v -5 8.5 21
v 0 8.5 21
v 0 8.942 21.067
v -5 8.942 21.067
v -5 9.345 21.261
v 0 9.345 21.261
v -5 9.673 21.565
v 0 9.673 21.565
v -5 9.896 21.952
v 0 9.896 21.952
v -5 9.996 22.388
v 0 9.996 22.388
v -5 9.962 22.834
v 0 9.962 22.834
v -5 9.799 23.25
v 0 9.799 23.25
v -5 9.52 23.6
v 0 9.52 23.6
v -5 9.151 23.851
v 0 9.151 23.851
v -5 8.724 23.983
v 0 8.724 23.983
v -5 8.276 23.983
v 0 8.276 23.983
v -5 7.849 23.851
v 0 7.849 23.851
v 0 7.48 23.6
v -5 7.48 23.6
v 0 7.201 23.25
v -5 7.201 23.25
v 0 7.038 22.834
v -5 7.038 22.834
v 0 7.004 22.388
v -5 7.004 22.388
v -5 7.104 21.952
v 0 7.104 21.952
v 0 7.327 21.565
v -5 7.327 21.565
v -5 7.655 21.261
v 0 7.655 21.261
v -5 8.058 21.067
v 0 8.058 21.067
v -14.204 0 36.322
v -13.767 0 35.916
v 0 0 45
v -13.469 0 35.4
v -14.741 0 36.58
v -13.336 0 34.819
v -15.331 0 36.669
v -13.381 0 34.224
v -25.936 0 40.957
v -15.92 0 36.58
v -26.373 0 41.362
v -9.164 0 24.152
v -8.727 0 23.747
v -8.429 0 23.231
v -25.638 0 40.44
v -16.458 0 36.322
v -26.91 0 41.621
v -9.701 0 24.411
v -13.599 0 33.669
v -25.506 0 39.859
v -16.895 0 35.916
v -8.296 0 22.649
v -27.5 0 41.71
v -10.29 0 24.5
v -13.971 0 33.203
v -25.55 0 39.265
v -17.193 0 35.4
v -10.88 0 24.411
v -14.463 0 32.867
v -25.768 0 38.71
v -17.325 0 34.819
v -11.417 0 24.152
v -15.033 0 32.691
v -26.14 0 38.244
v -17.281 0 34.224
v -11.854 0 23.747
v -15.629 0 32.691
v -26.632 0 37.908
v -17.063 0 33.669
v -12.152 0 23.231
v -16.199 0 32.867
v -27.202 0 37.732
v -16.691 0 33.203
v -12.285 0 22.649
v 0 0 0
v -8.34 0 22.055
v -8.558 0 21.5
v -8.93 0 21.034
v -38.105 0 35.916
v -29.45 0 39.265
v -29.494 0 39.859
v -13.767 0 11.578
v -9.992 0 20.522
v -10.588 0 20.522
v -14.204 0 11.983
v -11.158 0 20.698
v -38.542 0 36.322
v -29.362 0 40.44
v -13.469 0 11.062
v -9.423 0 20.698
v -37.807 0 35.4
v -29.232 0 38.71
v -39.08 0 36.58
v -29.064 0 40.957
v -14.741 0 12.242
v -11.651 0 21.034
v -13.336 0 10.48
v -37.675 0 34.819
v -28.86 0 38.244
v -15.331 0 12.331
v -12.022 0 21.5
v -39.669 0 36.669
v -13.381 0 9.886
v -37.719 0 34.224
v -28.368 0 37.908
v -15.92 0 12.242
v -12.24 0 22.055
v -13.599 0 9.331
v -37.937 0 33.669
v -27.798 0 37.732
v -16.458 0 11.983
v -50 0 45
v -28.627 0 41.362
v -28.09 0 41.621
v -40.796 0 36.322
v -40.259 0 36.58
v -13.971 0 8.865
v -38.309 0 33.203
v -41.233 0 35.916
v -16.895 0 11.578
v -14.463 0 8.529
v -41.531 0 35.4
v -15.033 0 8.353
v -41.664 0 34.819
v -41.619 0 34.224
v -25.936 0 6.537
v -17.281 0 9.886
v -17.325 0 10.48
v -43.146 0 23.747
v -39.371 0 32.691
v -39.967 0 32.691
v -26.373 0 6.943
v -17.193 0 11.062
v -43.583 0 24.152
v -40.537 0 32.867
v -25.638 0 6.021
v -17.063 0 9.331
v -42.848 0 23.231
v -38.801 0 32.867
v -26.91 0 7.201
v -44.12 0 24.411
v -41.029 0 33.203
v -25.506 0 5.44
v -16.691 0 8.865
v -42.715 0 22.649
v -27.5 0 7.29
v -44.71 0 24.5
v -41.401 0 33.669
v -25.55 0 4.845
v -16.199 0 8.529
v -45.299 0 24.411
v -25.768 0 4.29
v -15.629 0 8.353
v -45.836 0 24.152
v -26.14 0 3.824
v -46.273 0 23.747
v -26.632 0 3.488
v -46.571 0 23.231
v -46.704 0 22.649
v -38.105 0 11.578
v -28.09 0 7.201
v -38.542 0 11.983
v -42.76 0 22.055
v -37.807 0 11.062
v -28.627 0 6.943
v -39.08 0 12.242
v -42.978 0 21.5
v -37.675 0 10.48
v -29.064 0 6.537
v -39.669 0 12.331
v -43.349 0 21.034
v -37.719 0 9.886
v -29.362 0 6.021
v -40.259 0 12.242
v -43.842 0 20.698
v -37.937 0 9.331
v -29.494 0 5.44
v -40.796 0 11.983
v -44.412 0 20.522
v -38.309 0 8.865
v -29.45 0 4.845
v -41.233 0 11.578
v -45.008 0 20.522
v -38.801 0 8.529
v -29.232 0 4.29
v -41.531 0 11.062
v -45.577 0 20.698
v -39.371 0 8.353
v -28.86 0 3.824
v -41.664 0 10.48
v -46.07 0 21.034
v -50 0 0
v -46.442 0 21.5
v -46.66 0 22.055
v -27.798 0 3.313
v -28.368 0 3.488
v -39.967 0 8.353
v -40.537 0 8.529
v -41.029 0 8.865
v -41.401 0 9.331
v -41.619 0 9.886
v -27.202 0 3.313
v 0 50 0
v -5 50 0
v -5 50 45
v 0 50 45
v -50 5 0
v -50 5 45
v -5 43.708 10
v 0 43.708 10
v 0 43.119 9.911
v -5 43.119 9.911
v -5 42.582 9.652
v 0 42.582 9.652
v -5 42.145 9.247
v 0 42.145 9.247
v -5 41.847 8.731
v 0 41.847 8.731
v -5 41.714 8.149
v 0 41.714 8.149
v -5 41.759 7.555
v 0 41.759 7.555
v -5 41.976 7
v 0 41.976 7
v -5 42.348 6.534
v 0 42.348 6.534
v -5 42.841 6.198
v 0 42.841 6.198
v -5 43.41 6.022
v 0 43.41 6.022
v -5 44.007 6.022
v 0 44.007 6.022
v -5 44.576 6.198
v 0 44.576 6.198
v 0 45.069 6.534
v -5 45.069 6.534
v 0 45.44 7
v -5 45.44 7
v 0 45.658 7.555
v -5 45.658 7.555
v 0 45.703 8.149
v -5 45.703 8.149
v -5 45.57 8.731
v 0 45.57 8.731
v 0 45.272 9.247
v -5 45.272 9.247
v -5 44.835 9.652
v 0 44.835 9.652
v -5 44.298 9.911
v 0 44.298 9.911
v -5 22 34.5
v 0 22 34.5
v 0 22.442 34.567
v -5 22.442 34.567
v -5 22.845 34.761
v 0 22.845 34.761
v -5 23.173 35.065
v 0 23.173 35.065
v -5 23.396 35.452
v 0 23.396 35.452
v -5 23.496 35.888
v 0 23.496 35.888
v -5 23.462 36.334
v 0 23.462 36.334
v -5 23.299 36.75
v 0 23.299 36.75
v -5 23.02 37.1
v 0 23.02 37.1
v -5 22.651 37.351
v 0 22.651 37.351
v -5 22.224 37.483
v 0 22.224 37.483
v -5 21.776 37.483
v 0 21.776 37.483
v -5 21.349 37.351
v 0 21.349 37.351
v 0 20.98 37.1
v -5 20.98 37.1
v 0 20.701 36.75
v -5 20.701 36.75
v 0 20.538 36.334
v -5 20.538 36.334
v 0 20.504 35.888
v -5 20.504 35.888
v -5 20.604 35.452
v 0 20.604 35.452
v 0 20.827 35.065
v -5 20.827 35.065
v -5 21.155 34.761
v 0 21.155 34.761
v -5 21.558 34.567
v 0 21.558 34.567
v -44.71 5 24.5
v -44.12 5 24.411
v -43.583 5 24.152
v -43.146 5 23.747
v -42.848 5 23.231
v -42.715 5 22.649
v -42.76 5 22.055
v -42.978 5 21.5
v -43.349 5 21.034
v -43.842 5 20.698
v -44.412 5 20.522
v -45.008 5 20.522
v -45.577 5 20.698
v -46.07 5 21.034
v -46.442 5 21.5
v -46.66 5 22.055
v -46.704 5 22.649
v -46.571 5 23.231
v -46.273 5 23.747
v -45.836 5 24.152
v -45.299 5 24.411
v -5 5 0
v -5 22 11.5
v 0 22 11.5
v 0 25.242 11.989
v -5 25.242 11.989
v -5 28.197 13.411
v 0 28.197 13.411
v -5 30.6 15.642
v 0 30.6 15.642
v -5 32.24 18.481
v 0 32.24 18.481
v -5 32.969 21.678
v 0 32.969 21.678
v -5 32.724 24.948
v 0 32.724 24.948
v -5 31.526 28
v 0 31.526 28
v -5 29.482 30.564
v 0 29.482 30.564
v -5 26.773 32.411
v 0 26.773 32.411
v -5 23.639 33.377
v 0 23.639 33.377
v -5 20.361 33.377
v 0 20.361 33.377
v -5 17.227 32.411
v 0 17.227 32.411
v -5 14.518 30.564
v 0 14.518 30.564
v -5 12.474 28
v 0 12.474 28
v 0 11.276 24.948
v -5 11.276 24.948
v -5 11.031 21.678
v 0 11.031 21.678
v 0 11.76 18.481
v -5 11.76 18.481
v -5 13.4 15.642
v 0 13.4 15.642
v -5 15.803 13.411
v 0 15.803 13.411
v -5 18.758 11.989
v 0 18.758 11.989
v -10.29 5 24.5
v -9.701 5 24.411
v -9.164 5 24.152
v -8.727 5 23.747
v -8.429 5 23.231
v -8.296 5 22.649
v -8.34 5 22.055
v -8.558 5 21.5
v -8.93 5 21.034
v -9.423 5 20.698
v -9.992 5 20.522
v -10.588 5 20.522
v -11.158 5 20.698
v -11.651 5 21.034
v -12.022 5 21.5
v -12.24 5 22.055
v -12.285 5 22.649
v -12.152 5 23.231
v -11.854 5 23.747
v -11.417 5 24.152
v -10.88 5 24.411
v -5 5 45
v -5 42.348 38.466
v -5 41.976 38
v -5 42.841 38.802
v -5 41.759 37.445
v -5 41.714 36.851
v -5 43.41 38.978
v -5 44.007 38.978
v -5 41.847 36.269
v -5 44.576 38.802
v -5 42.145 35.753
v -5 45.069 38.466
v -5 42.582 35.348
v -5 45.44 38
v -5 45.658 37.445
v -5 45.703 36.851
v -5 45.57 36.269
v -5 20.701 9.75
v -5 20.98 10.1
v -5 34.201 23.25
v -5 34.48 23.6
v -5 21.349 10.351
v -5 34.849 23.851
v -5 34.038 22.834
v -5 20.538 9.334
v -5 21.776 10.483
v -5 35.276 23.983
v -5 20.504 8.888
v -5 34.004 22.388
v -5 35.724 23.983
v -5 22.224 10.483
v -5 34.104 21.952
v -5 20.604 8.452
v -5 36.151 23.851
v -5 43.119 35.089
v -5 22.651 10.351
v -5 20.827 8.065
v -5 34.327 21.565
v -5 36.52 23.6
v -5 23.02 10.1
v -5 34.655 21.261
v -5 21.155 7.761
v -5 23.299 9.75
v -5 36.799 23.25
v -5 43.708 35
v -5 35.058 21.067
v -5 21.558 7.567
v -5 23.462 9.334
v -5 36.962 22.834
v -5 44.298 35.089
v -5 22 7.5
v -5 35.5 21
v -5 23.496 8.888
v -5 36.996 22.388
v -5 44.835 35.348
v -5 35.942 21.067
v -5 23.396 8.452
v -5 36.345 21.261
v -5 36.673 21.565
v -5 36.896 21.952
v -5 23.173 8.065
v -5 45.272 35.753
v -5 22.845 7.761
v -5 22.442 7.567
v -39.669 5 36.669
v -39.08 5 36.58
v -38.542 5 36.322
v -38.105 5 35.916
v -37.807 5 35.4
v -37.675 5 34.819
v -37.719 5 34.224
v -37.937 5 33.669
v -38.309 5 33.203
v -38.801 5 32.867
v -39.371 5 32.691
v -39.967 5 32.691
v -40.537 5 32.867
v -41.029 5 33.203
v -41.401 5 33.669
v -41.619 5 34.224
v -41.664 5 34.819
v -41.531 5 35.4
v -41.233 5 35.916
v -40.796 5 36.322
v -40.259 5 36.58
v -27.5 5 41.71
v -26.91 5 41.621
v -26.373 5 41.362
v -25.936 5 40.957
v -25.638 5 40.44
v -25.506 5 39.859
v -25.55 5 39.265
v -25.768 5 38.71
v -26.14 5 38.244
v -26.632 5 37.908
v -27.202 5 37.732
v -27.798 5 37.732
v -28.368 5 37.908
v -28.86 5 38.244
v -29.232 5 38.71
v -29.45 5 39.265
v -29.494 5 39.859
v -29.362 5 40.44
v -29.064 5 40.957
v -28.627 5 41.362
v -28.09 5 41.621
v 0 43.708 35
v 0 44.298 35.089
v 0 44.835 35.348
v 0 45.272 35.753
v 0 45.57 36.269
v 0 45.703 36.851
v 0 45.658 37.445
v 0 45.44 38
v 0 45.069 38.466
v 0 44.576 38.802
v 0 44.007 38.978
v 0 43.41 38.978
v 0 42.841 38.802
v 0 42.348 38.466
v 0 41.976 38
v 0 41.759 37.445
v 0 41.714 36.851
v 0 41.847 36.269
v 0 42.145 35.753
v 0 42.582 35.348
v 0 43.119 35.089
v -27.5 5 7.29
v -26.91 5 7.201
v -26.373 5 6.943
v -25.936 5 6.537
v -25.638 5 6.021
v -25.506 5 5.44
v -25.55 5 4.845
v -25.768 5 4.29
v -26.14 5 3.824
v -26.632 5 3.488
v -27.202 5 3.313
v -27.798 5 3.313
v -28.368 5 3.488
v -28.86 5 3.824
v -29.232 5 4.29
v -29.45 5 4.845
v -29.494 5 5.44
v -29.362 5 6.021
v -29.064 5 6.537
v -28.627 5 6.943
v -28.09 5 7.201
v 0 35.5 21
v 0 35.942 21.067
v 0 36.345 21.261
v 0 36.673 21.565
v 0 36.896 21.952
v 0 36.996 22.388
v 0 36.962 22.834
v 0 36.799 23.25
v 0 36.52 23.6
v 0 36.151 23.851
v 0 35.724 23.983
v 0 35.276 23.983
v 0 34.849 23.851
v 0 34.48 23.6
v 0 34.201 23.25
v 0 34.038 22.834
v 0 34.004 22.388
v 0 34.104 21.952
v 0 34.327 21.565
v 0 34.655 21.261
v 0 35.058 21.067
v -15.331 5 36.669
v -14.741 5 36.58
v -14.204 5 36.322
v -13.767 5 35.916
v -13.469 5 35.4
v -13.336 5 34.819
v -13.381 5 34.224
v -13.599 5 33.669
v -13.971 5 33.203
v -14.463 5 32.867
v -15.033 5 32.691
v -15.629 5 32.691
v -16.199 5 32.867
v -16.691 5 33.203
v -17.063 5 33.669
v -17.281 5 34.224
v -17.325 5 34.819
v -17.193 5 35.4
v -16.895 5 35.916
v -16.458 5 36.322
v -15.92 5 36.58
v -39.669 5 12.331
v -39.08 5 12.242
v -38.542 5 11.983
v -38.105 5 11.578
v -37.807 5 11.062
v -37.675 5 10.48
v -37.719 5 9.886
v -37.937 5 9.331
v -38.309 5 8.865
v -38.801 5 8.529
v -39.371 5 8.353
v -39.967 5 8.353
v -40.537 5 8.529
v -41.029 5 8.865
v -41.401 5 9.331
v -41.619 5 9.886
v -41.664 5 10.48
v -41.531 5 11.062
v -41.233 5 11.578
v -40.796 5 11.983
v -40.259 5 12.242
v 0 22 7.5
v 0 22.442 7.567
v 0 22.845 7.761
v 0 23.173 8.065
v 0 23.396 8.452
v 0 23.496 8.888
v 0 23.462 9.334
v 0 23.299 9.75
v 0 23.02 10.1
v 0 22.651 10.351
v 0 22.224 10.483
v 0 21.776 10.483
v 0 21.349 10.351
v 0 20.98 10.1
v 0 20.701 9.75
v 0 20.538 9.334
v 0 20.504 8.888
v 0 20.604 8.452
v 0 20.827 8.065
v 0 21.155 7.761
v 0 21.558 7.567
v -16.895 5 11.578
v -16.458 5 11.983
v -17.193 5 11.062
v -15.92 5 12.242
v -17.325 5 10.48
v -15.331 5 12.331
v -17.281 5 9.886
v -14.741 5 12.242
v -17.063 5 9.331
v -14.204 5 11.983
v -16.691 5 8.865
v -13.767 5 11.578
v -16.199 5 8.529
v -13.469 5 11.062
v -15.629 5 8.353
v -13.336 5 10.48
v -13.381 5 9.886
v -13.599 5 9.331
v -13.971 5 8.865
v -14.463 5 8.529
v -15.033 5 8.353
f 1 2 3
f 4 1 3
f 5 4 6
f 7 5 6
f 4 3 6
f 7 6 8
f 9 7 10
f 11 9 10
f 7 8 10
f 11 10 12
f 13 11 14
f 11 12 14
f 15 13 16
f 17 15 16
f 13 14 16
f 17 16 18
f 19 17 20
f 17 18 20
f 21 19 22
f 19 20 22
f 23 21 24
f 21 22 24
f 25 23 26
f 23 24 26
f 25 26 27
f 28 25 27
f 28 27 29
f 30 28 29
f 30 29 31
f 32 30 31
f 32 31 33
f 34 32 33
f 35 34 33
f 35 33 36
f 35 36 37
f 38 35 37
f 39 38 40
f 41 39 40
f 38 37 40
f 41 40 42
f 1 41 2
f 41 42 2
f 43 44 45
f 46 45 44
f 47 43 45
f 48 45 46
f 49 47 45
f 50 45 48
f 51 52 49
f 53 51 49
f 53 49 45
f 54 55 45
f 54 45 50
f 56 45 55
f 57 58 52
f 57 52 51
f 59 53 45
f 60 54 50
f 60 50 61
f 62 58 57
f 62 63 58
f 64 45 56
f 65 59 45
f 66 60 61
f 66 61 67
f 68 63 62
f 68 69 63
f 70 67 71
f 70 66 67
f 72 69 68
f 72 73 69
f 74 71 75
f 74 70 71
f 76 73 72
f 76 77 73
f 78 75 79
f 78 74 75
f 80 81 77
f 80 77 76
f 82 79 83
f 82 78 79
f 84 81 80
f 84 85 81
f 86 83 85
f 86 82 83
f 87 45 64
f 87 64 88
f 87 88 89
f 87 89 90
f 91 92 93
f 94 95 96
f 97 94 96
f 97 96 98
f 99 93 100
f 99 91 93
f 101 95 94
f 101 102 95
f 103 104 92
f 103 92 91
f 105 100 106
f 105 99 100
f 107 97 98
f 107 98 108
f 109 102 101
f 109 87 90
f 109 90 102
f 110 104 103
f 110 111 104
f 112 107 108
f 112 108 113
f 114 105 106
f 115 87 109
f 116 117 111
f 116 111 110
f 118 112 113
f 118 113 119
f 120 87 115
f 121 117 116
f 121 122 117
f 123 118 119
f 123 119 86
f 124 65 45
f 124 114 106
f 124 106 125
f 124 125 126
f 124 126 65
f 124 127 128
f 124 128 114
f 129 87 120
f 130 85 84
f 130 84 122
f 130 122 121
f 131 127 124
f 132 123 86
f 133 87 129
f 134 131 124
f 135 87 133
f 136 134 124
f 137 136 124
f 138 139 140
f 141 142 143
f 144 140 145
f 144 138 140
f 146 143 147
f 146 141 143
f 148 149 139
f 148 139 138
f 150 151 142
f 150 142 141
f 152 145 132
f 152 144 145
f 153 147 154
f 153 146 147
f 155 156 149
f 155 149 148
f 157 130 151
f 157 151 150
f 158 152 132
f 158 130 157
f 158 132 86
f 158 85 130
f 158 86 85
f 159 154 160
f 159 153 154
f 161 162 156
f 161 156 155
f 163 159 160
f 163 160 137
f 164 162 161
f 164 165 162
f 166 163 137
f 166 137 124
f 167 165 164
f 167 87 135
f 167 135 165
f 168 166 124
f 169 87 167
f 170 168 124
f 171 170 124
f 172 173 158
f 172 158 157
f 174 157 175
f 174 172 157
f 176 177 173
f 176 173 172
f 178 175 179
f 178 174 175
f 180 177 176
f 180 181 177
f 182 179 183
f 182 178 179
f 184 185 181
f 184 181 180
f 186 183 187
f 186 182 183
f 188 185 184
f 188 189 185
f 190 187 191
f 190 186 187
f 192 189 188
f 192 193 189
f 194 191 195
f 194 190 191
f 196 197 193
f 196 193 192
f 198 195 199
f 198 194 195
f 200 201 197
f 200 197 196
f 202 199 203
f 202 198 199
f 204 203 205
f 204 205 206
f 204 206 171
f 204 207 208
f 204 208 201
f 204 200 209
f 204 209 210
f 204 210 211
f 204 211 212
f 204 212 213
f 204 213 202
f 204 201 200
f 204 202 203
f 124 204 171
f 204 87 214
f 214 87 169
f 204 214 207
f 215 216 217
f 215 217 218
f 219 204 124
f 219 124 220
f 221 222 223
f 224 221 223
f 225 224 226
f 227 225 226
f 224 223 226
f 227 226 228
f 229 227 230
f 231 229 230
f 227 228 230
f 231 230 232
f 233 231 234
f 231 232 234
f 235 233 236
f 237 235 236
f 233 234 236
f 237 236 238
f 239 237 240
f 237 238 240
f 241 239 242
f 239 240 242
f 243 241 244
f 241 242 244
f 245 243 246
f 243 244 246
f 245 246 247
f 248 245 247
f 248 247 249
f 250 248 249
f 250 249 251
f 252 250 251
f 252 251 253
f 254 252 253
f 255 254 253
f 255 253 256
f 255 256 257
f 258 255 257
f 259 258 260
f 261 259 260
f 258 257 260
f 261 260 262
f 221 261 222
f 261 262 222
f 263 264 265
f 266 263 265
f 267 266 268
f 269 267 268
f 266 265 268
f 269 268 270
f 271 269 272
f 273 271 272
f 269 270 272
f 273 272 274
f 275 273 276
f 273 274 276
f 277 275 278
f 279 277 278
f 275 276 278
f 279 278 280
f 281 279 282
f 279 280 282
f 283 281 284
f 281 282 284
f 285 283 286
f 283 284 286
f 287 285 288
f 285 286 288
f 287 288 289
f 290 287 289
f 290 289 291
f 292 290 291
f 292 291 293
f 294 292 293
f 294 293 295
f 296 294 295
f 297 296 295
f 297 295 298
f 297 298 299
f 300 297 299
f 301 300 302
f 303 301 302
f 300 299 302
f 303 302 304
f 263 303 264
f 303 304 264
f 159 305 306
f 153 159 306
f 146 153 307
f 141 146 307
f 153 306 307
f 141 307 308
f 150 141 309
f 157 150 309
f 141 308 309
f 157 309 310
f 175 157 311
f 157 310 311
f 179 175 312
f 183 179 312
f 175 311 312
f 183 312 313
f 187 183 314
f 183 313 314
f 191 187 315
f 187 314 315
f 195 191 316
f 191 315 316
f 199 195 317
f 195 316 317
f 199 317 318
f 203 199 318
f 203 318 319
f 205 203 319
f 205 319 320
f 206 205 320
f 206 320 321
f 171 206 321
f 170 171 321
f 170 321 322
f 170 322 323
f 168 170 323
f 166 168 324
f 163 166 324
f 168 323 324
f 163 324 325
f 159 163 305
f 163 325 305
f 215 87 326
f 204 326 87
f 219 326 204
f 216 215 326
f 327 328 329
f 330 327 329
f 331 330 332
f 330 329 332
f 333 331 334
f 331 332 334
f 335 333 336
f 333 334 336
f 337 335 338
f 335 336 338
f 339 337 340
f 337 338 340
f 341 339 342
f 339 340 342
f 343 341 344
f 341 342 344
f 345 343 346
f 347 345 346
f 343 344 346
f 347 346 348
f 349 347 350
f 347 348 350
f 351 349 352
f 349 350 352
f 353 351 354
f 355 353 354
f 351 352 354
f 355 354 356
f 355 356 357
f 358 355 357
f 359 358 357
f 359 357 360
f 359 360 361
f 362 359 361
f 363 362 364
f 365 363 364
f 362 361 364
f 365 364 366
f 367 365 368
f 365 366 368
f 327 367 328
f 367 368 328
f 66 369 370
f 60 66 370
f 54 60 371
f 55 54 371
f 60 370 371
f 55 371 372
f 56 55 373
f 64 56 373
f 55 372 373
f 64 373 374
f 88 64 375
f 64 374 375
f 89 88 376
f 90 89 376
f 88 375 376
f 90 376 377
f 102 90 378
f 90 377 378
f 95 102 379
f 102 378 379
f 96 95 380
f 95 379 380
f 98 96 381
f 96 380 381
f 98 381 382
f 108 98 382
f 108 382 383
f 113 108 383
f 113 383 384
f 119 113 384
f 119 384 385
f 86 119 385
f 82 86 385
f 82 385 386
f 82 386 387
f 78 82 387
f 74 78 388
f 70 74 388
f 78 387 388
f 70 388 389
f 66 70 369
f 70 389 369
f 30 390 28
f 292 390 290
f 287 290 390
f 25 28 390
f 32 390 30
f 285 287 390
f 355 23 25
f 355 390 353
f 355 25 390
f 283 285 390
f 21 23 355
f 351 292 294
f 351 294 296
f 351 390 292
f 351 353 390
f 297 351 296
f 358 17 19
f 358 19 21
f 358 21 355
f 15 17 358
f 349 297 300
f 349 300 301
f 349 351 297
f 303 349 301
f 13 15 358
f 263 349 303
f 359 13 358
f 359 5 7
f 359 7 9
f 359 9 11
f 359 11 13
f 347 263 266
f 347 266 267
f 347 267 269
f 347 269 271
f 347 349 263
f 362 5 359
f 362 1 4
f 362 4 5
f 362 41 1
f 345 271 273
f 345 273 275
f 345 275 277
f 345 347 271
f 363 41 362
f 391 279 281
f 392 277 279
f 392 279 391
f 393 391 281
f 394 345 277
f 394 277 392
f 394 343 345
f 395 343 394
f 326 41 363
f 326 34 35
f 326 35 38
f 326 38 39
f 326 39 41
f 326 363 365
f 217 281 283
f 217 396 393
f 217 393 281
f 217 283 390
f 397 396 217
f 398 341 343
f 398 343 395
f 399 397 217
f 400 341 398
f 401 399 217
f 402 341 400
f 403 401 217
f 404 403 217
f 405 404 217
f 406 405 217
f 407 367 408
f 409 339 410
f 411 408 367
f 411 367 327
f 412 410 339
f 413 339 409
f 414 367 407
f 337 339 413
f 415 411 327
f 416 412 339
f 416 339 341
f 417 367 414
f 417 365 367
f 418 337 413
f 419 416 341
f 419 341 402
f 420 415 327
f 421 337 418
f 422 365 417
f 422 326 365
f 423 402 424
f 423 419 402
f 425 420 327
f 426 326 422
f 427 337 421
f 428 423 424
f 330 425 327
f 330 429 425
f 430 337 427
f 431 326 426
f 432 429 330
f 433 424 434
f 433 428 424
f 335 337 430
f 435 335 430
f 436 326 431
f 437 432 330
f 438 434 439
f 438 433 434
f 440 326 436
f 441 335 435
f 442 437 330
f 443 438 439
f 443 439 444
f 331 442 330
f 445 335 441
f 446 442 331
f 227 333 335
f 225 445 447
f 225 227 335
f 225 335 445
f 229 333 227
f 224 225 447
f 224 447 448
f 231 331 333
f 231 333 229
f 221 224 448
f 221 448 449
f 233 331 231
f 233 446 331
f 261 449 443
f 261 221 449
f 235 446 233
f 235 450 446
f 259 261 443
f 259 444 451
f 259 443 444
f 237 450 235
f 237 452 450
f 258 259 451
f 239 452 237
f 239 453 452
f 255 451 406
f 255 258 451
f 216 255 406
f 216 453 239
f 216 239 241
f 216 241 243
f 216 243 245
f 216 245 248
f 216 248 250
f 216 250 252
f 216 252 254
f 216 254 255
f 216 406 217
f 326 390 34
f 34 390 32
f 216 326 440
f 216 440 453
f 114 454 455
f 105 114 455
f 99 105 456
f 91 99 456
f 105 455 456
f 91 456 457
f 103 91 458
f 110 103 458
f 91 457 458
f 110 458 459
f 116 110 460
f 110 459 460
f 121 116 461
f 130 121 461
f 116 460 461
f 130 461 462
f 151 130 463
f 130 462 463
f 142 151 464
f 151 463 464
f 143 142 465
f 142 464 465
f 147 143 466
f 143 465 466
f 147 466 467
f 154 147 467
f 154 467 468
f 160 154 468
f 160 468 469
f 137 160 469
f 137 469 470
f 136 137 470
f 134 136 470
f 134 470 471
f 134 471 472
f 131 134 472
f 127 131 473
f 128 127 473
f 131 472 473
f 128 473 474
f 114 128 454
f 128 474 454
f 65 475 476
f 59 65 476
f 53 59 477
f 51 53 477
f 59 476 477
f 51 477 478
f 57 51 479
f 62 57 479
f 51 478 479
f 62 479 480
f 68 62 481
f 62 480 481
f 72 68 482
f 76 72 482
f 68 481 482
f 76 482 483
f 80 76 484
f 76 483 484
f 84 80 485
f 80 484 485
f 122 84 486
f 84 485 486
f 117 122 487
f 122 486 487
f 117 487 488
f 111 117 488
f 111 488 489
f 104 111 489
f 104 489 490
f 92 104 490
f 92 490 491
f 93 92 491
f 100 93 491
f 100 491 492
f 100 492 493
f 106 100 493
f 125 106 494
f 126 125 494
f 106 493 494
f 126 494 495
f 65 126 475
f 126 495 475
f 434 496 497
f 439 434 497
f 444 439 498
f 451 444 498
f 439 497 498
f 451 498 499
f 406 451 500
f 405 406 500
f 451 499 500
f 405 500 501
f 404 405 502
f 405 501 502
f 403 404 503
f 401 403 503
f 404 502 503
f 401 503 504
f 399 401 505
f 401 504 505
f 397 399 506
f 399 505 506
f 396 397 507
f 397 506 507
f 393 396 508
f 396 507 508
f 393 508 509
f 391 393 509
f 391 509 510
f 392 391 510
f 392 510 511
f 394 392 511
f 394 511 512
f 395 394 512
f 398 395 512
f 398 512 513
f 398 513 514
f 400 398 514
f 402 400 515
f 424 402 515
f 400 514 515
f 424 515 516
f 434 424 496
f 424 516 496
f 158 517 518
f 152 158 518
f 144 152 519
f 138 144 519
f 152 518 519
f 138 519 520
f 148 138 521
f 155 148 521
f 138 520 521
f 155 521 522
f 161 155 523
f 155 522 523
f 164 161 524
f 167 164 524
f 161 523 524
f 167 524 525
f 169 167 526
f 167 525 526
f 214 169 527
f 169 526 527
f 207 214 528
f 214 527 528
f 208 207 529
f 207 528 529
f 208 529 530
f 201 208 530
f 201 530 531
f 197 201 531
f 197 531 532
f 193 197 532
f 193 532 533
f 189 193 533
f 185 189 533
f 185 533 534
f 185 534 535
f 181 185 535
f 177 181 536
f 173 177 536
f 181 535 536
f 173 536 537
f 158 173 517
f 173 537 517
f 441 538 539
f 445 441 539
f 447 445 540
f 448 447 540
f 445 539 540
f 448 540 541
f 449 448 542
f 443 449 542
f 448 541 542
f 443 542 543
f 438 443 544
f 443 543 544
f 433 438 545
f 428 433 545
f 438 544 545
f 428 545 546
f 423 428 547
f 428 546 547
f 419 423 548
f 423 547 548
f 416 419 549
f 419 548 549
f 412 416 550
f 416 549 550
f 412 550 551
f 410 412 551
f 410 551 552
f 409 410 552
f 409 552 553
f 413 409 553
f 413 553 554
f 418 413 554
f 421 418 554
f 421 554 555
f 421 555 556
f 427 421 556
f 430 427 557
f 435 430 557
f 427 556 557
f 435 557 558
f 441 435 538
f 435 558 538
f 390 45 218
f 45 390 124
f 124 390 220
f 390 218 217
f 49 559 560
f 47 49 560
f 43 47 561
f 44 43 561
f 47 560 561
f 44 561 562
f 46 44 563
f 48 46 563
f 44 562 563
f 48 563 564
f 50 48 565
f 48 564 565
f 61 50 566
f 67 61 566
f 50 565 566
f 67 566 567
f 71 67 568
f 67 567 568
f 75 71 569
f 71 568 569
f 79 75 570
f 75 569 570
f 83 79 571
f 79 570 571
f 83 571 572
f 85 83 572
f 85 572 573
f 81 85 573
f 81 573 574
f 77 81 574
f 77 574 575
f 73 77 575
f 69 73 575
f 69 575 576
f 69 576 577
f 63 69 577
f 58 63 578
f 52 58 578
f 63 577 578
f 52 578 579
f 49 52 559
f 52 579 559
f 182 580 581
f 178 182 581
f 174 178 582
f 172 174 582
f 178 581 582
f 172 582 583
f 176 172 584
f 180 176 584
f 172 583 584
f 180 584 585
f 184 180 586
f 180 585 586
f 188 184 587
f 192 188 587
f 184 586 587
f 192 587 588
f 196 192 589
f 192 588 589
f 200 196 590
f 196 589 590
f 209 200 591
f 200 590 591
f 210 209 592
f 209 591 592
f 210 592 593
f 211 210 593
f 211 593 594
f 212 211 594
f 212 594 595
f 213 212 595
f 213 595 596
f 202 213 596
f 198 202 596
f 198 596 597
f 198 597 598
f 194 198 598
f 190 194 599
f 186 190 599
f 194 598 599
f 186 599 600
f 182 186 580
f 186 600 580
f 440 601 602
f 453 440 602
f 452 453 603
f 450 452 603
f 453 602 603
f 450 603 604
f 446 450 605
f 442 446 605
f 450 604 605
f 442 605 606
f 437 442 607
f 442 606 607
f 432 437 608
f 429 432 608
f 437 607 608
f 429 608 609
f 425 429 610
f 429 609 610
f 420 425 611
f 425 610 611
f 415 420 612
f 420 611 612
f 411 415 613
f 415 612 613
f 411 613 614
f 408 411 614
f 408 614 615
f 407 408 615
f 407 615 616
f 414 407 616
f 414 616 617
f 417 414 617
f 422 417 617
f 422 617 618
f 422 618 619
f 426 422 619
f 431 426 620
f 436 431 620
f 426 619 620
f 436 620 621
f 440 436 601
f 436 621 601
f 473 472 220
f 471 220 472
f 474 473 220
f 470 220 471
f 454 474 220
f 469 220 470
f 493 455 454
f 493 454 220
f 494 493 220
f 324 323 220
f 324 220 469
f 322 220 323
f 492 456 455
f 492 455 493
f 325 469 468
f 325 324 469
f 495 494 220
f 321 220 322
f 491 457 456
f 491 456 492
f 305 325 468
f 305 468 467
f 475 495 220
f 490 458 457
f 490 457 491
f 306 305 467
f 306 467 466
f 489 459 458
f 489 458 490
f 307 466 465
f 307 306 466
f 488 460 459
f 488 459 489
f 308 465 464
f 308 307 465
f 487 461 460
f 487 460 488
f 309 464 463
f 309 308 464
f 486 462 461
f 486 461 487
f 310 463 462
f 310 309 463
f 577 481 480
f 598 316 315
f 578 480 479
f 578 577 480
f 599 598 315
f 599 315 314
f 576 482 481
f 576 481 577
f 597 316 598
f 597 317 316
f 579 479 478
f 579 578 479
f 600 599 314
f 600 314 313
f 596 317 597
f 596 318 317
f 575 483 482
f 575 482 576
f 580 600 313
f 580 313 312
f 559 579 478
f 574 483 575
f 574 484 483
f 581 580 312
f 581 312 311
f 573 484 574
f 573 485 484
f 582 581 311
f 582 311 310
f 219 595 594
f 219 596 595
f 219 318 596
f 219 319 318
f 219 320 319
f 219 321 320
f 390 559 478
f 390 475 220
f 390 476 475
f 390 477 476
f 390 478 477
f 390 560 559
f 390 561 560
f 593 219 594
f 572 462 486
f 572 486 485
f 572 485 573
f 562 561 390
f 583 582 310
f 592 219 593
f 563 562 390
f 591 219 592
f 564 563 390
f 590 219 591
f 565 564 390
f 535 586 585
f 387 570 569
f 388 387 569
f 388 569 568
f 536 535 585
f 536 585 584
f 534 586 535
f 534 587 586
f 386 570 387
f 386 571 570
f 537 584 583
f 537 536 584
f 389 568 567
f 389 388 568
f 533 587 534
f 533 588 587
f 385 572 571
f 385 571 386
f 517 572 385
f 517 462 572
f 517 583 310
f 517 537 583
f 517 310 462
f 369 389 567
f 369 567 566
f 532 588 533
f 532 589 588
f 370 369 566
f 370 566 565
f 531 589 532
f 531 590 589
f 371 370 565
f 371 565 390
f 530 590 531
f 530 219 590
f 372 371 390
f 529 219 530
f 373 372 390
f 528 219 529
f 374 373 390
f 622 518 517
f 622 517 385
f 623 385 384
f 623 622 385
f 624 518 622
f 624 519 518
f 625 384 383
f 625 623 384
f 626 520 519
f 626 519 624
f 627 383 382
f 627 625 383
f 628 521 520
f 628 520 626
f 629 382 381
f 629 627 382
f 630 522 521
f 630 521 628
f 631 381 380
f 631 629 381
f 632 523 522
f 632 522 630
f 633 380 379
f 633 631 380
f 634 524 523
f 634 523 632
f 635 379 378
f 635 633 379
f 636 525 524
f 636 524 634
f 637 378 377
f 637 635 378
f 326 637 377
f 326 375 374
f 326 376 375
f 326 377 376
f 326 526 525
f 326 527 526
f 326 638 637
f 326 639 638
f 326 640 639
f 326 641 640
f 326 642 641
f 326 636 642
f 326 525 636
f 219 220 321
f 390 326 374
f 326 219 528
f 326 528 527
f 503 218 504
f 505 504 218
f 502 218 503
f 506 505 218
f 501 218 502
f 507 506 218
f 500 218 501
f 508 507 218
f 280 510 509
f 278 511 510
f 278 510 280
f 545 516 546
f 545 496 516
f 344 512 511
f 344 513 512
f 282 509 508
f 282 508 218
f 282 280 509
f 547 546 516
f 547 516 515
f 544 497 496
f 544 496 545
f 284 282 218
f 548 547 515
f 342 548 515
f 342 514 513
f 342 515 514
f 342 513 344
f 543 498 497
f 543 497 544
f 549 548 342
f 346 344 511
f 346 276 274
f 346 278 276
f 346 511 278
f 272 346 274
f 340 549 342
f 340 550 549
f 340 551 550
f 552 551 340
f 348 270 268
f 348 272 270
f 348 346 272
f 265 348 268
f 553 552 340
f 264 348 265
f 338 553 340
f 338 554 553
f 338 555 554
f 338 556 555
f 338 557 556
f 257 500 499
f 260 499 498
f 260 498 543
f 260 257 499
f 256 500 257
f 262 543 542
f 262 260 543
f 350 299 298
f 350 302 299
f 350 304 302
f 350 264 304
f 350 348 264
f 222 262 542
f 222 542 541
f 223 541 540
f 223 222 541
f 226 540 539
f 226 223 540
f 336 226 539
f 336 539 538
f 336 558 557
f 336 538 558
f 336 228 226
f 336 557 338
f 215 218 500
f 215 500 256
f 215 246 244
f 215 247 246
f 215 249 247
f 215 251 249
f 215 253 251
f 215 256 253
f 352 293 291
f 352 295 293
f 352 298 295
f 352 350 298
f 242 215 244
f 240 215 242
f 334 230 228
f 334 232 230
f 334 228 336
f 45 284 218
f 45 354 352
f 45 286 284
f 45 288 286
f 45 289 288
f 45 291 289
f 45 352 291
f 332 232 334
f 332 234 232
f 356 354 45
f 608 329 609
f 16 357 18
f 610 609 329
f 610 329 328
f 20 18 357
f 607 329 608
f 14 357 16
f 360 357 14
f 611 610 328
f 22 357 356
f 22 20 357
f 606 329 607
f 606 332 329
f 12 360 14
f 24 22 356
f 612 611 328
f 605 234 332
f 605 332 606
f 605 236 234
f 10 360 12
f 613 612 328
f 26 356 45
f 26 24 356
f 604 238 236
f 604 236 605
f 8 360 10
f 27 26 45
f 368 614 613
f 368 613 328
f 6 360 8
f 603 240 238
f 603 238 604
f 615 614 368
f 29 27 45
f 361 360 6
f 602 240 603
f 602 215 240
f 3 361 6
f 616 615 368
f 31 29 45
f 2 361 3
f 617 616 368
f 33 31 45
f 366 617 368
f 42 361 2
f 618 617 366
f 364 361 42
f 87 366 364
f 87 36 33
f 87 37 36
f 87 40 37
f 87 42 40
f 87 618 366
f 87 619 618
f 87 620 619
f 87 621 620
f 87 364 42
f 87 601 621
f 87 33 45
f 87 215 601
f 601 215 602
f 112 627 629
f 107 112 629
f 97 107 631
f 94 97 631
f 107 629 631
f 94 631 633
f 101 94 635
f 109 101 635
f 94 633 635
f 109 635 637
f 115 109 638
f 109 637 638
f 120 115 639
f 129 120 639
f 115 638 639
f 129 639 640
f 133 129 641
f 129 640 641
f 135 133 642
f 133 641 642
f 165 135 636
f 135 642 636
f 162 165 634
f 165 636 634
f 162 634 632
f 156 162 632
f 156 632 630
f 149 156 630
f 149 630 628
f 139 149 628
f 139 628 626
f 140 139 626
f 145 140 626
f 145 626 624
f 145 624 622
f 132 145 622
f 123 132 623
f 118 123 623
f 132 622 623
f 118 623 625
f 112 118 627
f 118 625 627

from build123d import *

# Parameters (mm, degrees)
BOSS_EXTRUDE1_DEPTH = 45
SKETCH2_R           = 11
CUT_EXTRUDE1_DEPTH  = 5
SKETCH3_R           = 1.5
CUT_EXTRUDE2_DEPTH  = 5
SKETCH4_R           = 2
CUT_EXTRUDE3_DEPTH  = 5
SKETCH5_R           = 2
CUT_EXTRUDE4_DEPTH  = 5


with BuildPart() as part:
    # Sketch1 → Boss-Extrude1 (new body)
    with BuildSketch(Plane.XY):
        Polygon((0, 50), (0, 0), (-50, 0), (-50, 5), (-5, 5), (-5, 50), align=None)
    extrude(amount=BOSS_EXTRUDE1_DEPTH)

    # Sketch2 → Cut-Extrude1 (cut)
    with BuildSketch(Plane(origin=(0, 0, 0), x_dir=(0, 0, -1), z_dir=(1, 0, 0))):
        with Locations((-22.5, 22)):
            Circle(SKETCH2_R)
    extrude(amount=-CUT_EXTRUDE1_DEPTH, mode=Mode.SUBTRACT)

    # Sketch3 → Cut-Extrude2 (cut)
    with BuildSketch(Plane(origin=(0, 0, 0), x_dir=(0, 0, -1), z_dir=(1, 0, 0))):
        with Locations((-22.5, 35.5)):
            Circle(SKETCH3_R)
        with Locations((-9, 22)):
            Circle(SKETCH3_R)
        with Locations((-22.5, 8.5)):
            Circle(SKETCH3_R)
        with Locations((-36, 22)):
            Circle(SKETCH3_R)
    extrude(amount=-CUT_EXTRUDE2_DEPTH, mode=Mode.SUBTRACT)

    # Sketch4 → Cut-Extrude3 (cut)
    with BuildSketch(Plane(origin=(0, 5, 0), x_dir=(1, 0, 0), z_dir=(0, 1, 0))):
        with Locations(Location((-27.5, -5.290295093, 0), (0, 0, 270))):
            Circle(SKETCH4_R)
        with Locations(Location((-15.330900958, -10.330900958, 0), (0, 0, 270))):
            Circle(SKETCH4_R)
        with Locations(Location((-10.290295093, -22.5, 0), (0, 0, 270))):
            Circle(SKETCH4_R)
        with Locations(Location((-15.330900958, -34.669099042, 0), (0, 0, 270))):
            Circle(SKETCH4_R)
        with Locations(Location((-27.5, -39.709704907, 0), (0, 0, 270))):
            Circle(SKETCH4_R)
        with Locations(Location((-39.669099042, -34.669099042, 0), (0, 0, 270))):
            Circle(SKETCH4_R)
        with Locations(Location((-44.709704907, -22.5, 0), (0, 0, 270))):
            Circle(SKETCH4_R)
        with Locations(Location((-39.669099042, -10.330900958, 0), (0, 0, 270))):
            Circle(SKETCH4_R)
    extrude(amount=-CUT_EXTRUDE3_DEPTH, mode=Mode.SUBTRACT)

    # Sketch5 → Cut-Extrude4 (cut)
    with BuildSketch(Plane(origin=(0, 0, 0), x_dir=(0, 0, -1), z_dir=(1, 0, 0))):
        with Locations((-37, 43.708447977)):
            Circle(SKETCH5_R)
        with Locations(Location((-8, 43.708447977, 0), (0, 0, 180))):
            Circle(SKETCH5_R)
    extrude(amount=-CUT_EXTRUDE4_DEPTH, mode=Mode.SUBTRACT)


solid = part.part
